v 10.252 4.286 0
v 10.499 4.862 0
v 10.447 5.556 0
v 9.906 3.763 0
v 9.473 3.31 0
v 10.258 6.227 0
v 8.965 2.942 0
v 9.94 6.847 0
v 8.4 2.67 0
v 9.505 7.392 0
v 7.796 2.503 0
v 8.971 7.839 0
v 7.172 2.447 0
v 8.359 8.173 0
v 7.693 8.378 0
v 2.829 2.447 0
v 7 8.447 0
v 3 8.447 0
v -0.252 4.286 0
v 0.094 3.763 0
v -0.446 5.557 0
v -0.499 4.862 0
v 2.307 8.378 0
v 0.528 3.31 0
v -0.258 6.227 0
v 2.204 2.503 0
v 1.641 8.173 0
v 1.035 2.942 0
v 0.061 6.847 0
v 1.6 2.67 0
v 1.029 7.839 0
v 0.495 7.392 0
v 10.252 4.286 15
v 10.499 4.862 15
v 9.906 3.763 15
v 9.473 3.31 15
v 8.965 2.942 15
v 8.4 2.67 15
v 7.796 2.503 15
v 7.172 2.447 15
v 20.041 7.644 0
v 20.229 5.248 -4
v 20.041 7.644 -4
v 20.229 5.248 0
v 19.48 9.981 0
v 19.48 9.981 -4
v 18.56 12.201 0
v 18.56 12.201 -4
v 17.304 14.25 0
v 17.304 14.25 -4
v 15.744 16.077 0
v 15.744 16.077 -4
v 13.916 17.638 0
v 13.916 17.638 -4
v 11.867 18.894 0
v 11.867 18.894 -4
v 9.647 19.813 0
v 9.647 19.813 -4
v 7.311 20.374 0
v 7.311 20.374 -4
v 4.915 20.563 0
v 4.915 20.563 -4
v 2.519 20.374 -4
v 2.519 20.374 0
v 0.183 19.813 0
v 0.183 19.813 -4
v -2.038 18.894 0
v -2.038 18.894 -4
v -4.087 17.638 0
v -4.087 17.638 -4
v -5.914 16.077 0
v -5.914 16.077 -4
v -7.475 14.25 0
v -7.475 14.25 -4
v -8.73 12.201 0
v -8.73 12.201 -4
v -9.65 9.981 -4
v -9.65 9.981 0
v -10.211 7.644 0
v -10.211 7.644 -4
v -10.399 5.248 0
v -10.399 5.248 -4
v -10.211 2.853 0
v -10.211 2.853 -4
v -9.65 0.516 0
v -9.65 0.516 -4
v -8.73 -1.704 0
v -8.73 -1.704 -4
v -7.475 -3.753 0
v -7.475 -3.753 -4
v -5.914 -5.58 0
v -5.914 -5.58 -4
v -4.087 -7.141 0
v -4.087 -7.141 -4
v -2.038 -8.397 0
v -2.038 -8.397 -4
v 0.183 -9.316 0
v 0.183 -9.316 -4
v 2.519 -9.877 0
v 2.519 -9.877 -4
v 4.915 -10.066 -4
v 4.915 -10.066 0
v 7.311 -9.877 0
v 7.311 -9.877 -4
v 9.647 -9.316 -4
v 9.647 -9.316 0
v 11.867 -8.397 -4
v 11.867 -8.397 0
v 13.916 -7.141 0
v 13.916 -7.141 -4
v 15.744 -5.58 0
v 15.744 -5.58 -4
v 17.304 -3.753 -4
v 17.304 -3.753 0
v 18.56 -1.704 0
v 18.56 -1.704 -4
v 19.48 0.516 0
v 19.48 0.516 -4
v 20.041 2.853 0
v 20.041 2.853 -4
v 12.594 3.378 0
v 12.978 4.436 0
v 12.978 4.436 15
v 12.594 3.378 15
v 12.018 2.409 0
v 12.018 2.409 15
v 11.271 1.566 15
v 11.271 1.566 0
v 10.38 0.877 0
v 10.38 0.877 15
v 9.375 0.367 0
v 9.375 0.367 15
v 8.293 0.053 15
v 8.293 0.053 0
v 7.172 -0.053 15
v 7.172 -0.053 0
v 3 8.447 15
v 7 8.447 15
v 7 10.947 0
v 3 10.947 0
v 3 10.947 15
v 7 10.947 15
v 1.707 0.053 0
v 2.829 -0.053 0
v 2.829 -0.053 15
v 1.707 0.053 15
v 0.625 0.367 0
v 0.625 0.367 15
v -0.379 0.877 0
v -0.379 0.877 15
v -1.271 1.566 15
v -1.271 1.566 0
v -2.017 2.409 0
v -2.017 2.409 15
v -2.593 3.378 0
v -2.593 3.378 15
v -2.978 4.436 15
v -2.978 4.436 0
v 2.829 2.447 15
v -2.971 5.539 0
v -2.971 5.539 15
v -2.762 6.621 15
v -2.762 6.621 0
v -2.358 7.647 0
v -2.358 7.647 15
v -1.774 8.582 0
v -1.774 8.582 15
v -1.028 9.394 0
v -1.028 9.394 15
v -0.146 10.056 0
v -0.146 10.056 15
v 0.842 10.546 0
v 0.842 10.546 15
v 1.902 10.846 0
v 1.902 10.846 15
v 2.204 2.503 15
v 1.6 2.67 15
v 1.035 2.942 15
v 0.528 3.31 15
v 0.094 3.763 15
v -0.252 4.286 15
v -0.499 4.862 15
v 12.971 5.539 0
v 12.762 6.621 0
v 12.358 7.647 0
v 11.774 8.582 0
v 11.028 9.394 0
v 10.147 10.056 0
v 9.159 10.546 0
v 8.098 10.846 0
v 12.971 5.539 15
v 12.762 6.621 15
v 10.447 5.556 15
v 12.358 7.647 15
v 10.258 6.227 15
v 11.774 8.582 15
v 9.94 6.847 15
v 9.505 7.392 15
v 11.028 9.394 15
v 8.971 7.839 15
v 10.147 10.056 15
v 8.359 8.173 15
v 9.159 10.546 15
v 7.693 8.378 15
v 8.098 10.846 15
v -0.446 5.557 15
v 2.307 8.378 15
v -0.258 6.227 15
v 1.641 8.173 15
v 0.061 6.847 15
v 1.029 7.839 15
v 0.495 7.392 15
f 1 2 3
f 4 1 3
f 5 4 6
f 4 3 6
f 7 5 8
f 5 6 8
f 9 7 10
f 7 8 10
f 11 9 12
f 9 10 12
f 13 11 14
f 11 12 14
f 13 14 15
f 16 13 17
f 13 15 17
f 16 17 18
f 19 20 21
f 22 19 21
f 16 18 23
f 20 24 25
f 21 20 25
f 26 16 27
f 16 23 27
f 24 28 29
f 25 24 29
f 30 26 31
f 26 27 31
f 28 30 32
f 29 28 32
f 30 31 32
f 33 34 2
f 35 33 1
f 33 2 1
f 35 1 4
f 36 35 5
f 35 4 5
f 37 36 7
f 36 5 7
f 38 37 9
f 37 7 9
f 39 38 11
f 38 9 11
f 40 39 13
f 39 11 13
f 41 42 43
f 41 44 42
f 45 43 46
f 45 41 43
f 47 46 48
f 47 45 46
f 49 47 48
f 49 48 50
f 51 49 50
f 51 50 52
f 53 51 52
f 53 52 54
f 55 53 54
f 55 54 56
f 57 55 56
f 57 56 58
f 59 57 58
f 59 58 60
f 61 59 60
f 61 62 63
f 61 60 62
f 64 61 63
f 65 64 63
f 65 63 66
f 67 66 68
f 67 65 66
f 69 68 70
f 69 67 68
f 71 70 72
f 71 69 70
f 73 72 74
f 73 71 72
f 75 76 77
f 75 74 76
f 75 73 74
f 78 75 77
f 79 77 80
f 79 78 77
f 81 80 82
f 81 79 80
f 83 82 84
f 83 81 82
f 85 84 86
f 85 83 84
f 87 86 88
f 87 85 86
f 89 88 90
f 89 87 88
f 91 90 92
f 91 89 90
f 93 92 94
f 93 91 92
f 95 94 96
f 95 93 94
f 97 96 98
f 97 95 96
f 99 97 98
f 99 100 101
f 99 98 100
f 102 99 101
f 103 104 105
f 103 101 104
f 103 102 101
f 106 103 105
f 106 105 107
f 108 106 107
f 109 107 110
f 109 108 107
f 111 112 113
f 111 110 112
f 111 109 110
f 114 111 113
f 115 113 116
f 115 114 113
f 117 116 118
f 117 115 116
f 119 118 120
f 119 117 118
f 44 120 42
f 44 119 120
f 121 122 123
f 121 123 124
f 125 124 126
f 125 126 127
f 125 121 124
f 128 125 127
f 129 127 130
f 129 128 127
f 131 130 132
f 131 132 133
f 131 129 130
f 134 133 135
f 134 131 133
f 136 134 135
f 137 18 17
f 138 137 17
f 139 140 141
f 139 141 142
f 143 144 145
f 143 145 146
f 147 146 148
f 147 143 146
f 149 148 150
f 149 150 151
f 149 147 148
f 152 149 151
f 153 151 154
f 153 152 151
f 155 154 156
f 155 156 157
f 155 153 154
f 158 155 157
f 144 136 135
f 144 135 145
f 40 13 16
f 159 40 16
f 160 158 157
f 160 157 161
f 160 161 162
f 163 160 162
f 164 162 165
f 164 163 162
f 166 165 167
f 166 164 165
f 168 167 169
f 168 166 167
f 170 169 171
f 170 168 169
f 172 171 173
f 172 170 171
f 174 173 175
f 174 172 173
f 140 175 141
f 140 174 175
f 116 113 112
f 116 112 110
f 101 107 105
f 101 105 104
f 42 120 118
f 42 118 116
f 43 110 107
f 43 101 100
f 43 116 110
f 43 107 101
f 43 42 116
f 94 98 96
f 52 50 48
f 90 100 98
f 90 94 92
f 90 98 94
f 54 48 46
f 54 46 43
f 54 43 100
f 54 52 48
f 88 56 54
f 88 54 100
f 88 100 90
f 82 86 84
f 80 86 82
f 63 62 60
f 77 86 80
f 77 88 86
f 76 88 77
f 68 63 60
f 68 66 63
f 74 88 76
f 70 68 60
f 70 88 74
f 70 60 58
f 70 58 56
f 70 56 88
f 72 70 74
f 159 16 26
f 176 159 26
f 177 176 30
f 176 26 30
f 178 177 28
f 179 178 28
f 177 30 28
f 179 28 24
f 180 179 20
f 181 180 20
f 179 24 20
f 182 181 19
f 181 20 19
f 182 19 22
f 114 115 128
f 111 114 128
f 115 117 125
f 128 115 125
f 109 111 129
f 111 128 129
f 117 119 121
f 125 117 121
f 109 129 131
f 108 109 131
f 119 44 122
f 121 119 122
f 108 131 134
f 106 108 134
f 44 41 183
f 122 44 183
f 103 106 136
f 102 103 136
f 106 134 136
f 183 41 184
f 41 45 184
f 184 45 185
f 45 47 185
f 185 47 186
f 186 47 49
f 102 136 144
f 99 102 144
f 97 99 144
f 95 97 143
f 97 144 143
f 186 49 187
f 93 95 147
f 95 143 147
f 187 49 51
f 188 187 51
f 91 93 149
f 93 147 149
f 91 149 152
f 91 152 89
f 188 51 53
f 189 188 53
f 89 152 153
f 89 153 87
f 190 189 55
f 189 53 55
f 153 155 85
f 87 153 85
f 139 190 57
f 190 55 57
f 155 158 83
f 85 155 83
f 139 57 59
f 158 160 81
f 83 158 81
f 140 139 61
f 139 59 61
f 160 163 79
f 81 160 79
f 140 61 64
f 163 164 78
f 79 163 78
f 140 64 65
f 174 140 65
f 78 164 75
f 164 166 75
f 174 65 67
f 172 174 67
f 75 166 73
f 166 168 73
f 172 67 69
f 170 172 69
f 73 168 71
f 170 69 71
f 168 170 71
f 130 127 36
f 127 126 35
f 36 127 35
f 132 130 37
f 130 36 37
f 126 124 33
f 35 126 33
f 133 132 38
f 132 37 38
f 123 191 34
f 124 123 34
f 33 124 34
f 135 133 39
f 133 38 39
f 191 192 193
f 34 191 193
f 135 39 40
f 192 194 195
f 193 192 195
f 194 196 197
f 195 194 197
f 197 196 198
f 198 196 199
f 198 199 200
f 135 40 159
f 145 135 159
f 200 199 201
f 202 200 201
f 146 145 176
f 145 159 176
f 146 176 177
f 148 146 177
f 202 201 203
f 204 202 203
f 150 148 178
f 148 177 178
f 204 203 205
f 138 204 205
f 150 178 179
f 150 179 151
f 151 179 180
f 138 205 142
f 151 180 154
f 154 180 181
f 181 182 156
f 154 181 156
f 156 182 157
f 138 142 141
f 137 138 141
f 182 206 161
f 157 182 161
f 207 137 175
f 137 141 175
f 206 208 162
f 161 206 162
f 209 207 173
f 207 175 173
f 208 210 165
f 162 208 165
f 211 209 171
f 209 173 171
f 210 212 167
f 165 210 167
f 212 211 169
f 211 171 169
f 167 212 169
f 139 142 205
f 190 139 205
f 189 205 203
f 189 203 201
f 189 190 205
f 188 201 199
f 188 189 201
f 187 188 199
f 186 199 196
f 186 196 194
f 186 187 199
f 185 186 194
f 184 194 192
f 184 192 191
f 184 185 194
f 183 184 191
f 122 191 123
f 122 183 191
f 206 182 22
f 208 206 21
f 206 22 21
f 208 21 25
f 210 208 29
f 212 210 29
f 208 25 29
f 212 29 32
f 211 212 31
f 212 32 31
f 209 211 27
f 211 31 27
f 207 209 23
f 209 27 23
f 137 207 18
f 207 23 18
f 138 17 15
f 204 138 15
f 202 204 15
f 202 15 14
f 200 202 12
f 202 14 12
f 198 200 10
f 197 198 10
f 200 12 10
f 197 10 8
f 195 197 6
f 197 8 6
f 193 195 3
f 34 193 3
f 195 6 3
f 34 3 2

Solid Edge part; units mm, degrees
sketch "Sketch1" plane through (0, 0, 0) normal (0, 0, 1) x (1, 0, 0)
  arc A0 (-2.9781, 4.4363) -> (3.0001, 10.9473) centre (3.0001, 4.9473) cw
  line L0 (3.0001, 10.9473) -> (7.0001, 10.9473)
  arc A1 (7.0001, 10.9473) -> (12.9783, 4.4363) centre (7.0001, 4.9473) cw
  arc A2 (12.9783, 4.4363) -> (10.4883, 0.9473) centre (7.1717, 5.9473) cw
  arc A3 (10.4883, 0.9473) -> (7.1717, -0.0527) centre (7.1717, 5.9473) cw
  line L1 (7.1717, -0.0527) -> (2.8286, -0.0527)
  arc A4 (2.8286, -0.0527) -> (-0.4881, 0.9473) centre (2.8286, 5.9473) cw
  arc A5 (-0.4881, 0.9473) -> (-2.9781, 4.4363) centre (2.8286, 5.9473) cw
  line L2 (3.0001, 8.4473) -> (7.0001, 8.4473)
  arc A6 (7.0001, 8.4473) -> (10.4991, 4.8617) centre (7.0001, 4.9473) cw
  arc A7 (10.4991, 4.8617) -> (9.1064, 3.0306) centre (7.1717, 5.9473) cw
  arc A8 (9.1064, 3.0306) -> (7.1717, 2.4473) centre (7.1717, 5.9473) cw
  line L3 (7.1717, 2.4473) -> (2.8286, 2.4473)
  arc A9 (2.8286, 2.4473) -> (0.8939, 3.0306) centre (2.8286, 5.9473) cw
  arc A10 (0.8939, 3.0306) -> (-0.4988, 4.8617) centre (2.8286, 5.9473) cw
  arc A11 (-0.4988, 4.8617) -> (3.0001, 8.4473) centre (3.0001, 4.9473) cw
  dimension "D1" = 2.5
extrude "Protrusion1" add sketch "Sketch1" along normal blind 15
sketch "Sketch2" plane through (5.0001, 5.4473, 0) normal (0, 0, -1) x (1, 0, 0)
  circle A0 centre (-0.0852, 0.1989) radius 15.3143
extrude "ExtrudedProtrusion_2" add sketch "Sketch2" along normal blind 4
